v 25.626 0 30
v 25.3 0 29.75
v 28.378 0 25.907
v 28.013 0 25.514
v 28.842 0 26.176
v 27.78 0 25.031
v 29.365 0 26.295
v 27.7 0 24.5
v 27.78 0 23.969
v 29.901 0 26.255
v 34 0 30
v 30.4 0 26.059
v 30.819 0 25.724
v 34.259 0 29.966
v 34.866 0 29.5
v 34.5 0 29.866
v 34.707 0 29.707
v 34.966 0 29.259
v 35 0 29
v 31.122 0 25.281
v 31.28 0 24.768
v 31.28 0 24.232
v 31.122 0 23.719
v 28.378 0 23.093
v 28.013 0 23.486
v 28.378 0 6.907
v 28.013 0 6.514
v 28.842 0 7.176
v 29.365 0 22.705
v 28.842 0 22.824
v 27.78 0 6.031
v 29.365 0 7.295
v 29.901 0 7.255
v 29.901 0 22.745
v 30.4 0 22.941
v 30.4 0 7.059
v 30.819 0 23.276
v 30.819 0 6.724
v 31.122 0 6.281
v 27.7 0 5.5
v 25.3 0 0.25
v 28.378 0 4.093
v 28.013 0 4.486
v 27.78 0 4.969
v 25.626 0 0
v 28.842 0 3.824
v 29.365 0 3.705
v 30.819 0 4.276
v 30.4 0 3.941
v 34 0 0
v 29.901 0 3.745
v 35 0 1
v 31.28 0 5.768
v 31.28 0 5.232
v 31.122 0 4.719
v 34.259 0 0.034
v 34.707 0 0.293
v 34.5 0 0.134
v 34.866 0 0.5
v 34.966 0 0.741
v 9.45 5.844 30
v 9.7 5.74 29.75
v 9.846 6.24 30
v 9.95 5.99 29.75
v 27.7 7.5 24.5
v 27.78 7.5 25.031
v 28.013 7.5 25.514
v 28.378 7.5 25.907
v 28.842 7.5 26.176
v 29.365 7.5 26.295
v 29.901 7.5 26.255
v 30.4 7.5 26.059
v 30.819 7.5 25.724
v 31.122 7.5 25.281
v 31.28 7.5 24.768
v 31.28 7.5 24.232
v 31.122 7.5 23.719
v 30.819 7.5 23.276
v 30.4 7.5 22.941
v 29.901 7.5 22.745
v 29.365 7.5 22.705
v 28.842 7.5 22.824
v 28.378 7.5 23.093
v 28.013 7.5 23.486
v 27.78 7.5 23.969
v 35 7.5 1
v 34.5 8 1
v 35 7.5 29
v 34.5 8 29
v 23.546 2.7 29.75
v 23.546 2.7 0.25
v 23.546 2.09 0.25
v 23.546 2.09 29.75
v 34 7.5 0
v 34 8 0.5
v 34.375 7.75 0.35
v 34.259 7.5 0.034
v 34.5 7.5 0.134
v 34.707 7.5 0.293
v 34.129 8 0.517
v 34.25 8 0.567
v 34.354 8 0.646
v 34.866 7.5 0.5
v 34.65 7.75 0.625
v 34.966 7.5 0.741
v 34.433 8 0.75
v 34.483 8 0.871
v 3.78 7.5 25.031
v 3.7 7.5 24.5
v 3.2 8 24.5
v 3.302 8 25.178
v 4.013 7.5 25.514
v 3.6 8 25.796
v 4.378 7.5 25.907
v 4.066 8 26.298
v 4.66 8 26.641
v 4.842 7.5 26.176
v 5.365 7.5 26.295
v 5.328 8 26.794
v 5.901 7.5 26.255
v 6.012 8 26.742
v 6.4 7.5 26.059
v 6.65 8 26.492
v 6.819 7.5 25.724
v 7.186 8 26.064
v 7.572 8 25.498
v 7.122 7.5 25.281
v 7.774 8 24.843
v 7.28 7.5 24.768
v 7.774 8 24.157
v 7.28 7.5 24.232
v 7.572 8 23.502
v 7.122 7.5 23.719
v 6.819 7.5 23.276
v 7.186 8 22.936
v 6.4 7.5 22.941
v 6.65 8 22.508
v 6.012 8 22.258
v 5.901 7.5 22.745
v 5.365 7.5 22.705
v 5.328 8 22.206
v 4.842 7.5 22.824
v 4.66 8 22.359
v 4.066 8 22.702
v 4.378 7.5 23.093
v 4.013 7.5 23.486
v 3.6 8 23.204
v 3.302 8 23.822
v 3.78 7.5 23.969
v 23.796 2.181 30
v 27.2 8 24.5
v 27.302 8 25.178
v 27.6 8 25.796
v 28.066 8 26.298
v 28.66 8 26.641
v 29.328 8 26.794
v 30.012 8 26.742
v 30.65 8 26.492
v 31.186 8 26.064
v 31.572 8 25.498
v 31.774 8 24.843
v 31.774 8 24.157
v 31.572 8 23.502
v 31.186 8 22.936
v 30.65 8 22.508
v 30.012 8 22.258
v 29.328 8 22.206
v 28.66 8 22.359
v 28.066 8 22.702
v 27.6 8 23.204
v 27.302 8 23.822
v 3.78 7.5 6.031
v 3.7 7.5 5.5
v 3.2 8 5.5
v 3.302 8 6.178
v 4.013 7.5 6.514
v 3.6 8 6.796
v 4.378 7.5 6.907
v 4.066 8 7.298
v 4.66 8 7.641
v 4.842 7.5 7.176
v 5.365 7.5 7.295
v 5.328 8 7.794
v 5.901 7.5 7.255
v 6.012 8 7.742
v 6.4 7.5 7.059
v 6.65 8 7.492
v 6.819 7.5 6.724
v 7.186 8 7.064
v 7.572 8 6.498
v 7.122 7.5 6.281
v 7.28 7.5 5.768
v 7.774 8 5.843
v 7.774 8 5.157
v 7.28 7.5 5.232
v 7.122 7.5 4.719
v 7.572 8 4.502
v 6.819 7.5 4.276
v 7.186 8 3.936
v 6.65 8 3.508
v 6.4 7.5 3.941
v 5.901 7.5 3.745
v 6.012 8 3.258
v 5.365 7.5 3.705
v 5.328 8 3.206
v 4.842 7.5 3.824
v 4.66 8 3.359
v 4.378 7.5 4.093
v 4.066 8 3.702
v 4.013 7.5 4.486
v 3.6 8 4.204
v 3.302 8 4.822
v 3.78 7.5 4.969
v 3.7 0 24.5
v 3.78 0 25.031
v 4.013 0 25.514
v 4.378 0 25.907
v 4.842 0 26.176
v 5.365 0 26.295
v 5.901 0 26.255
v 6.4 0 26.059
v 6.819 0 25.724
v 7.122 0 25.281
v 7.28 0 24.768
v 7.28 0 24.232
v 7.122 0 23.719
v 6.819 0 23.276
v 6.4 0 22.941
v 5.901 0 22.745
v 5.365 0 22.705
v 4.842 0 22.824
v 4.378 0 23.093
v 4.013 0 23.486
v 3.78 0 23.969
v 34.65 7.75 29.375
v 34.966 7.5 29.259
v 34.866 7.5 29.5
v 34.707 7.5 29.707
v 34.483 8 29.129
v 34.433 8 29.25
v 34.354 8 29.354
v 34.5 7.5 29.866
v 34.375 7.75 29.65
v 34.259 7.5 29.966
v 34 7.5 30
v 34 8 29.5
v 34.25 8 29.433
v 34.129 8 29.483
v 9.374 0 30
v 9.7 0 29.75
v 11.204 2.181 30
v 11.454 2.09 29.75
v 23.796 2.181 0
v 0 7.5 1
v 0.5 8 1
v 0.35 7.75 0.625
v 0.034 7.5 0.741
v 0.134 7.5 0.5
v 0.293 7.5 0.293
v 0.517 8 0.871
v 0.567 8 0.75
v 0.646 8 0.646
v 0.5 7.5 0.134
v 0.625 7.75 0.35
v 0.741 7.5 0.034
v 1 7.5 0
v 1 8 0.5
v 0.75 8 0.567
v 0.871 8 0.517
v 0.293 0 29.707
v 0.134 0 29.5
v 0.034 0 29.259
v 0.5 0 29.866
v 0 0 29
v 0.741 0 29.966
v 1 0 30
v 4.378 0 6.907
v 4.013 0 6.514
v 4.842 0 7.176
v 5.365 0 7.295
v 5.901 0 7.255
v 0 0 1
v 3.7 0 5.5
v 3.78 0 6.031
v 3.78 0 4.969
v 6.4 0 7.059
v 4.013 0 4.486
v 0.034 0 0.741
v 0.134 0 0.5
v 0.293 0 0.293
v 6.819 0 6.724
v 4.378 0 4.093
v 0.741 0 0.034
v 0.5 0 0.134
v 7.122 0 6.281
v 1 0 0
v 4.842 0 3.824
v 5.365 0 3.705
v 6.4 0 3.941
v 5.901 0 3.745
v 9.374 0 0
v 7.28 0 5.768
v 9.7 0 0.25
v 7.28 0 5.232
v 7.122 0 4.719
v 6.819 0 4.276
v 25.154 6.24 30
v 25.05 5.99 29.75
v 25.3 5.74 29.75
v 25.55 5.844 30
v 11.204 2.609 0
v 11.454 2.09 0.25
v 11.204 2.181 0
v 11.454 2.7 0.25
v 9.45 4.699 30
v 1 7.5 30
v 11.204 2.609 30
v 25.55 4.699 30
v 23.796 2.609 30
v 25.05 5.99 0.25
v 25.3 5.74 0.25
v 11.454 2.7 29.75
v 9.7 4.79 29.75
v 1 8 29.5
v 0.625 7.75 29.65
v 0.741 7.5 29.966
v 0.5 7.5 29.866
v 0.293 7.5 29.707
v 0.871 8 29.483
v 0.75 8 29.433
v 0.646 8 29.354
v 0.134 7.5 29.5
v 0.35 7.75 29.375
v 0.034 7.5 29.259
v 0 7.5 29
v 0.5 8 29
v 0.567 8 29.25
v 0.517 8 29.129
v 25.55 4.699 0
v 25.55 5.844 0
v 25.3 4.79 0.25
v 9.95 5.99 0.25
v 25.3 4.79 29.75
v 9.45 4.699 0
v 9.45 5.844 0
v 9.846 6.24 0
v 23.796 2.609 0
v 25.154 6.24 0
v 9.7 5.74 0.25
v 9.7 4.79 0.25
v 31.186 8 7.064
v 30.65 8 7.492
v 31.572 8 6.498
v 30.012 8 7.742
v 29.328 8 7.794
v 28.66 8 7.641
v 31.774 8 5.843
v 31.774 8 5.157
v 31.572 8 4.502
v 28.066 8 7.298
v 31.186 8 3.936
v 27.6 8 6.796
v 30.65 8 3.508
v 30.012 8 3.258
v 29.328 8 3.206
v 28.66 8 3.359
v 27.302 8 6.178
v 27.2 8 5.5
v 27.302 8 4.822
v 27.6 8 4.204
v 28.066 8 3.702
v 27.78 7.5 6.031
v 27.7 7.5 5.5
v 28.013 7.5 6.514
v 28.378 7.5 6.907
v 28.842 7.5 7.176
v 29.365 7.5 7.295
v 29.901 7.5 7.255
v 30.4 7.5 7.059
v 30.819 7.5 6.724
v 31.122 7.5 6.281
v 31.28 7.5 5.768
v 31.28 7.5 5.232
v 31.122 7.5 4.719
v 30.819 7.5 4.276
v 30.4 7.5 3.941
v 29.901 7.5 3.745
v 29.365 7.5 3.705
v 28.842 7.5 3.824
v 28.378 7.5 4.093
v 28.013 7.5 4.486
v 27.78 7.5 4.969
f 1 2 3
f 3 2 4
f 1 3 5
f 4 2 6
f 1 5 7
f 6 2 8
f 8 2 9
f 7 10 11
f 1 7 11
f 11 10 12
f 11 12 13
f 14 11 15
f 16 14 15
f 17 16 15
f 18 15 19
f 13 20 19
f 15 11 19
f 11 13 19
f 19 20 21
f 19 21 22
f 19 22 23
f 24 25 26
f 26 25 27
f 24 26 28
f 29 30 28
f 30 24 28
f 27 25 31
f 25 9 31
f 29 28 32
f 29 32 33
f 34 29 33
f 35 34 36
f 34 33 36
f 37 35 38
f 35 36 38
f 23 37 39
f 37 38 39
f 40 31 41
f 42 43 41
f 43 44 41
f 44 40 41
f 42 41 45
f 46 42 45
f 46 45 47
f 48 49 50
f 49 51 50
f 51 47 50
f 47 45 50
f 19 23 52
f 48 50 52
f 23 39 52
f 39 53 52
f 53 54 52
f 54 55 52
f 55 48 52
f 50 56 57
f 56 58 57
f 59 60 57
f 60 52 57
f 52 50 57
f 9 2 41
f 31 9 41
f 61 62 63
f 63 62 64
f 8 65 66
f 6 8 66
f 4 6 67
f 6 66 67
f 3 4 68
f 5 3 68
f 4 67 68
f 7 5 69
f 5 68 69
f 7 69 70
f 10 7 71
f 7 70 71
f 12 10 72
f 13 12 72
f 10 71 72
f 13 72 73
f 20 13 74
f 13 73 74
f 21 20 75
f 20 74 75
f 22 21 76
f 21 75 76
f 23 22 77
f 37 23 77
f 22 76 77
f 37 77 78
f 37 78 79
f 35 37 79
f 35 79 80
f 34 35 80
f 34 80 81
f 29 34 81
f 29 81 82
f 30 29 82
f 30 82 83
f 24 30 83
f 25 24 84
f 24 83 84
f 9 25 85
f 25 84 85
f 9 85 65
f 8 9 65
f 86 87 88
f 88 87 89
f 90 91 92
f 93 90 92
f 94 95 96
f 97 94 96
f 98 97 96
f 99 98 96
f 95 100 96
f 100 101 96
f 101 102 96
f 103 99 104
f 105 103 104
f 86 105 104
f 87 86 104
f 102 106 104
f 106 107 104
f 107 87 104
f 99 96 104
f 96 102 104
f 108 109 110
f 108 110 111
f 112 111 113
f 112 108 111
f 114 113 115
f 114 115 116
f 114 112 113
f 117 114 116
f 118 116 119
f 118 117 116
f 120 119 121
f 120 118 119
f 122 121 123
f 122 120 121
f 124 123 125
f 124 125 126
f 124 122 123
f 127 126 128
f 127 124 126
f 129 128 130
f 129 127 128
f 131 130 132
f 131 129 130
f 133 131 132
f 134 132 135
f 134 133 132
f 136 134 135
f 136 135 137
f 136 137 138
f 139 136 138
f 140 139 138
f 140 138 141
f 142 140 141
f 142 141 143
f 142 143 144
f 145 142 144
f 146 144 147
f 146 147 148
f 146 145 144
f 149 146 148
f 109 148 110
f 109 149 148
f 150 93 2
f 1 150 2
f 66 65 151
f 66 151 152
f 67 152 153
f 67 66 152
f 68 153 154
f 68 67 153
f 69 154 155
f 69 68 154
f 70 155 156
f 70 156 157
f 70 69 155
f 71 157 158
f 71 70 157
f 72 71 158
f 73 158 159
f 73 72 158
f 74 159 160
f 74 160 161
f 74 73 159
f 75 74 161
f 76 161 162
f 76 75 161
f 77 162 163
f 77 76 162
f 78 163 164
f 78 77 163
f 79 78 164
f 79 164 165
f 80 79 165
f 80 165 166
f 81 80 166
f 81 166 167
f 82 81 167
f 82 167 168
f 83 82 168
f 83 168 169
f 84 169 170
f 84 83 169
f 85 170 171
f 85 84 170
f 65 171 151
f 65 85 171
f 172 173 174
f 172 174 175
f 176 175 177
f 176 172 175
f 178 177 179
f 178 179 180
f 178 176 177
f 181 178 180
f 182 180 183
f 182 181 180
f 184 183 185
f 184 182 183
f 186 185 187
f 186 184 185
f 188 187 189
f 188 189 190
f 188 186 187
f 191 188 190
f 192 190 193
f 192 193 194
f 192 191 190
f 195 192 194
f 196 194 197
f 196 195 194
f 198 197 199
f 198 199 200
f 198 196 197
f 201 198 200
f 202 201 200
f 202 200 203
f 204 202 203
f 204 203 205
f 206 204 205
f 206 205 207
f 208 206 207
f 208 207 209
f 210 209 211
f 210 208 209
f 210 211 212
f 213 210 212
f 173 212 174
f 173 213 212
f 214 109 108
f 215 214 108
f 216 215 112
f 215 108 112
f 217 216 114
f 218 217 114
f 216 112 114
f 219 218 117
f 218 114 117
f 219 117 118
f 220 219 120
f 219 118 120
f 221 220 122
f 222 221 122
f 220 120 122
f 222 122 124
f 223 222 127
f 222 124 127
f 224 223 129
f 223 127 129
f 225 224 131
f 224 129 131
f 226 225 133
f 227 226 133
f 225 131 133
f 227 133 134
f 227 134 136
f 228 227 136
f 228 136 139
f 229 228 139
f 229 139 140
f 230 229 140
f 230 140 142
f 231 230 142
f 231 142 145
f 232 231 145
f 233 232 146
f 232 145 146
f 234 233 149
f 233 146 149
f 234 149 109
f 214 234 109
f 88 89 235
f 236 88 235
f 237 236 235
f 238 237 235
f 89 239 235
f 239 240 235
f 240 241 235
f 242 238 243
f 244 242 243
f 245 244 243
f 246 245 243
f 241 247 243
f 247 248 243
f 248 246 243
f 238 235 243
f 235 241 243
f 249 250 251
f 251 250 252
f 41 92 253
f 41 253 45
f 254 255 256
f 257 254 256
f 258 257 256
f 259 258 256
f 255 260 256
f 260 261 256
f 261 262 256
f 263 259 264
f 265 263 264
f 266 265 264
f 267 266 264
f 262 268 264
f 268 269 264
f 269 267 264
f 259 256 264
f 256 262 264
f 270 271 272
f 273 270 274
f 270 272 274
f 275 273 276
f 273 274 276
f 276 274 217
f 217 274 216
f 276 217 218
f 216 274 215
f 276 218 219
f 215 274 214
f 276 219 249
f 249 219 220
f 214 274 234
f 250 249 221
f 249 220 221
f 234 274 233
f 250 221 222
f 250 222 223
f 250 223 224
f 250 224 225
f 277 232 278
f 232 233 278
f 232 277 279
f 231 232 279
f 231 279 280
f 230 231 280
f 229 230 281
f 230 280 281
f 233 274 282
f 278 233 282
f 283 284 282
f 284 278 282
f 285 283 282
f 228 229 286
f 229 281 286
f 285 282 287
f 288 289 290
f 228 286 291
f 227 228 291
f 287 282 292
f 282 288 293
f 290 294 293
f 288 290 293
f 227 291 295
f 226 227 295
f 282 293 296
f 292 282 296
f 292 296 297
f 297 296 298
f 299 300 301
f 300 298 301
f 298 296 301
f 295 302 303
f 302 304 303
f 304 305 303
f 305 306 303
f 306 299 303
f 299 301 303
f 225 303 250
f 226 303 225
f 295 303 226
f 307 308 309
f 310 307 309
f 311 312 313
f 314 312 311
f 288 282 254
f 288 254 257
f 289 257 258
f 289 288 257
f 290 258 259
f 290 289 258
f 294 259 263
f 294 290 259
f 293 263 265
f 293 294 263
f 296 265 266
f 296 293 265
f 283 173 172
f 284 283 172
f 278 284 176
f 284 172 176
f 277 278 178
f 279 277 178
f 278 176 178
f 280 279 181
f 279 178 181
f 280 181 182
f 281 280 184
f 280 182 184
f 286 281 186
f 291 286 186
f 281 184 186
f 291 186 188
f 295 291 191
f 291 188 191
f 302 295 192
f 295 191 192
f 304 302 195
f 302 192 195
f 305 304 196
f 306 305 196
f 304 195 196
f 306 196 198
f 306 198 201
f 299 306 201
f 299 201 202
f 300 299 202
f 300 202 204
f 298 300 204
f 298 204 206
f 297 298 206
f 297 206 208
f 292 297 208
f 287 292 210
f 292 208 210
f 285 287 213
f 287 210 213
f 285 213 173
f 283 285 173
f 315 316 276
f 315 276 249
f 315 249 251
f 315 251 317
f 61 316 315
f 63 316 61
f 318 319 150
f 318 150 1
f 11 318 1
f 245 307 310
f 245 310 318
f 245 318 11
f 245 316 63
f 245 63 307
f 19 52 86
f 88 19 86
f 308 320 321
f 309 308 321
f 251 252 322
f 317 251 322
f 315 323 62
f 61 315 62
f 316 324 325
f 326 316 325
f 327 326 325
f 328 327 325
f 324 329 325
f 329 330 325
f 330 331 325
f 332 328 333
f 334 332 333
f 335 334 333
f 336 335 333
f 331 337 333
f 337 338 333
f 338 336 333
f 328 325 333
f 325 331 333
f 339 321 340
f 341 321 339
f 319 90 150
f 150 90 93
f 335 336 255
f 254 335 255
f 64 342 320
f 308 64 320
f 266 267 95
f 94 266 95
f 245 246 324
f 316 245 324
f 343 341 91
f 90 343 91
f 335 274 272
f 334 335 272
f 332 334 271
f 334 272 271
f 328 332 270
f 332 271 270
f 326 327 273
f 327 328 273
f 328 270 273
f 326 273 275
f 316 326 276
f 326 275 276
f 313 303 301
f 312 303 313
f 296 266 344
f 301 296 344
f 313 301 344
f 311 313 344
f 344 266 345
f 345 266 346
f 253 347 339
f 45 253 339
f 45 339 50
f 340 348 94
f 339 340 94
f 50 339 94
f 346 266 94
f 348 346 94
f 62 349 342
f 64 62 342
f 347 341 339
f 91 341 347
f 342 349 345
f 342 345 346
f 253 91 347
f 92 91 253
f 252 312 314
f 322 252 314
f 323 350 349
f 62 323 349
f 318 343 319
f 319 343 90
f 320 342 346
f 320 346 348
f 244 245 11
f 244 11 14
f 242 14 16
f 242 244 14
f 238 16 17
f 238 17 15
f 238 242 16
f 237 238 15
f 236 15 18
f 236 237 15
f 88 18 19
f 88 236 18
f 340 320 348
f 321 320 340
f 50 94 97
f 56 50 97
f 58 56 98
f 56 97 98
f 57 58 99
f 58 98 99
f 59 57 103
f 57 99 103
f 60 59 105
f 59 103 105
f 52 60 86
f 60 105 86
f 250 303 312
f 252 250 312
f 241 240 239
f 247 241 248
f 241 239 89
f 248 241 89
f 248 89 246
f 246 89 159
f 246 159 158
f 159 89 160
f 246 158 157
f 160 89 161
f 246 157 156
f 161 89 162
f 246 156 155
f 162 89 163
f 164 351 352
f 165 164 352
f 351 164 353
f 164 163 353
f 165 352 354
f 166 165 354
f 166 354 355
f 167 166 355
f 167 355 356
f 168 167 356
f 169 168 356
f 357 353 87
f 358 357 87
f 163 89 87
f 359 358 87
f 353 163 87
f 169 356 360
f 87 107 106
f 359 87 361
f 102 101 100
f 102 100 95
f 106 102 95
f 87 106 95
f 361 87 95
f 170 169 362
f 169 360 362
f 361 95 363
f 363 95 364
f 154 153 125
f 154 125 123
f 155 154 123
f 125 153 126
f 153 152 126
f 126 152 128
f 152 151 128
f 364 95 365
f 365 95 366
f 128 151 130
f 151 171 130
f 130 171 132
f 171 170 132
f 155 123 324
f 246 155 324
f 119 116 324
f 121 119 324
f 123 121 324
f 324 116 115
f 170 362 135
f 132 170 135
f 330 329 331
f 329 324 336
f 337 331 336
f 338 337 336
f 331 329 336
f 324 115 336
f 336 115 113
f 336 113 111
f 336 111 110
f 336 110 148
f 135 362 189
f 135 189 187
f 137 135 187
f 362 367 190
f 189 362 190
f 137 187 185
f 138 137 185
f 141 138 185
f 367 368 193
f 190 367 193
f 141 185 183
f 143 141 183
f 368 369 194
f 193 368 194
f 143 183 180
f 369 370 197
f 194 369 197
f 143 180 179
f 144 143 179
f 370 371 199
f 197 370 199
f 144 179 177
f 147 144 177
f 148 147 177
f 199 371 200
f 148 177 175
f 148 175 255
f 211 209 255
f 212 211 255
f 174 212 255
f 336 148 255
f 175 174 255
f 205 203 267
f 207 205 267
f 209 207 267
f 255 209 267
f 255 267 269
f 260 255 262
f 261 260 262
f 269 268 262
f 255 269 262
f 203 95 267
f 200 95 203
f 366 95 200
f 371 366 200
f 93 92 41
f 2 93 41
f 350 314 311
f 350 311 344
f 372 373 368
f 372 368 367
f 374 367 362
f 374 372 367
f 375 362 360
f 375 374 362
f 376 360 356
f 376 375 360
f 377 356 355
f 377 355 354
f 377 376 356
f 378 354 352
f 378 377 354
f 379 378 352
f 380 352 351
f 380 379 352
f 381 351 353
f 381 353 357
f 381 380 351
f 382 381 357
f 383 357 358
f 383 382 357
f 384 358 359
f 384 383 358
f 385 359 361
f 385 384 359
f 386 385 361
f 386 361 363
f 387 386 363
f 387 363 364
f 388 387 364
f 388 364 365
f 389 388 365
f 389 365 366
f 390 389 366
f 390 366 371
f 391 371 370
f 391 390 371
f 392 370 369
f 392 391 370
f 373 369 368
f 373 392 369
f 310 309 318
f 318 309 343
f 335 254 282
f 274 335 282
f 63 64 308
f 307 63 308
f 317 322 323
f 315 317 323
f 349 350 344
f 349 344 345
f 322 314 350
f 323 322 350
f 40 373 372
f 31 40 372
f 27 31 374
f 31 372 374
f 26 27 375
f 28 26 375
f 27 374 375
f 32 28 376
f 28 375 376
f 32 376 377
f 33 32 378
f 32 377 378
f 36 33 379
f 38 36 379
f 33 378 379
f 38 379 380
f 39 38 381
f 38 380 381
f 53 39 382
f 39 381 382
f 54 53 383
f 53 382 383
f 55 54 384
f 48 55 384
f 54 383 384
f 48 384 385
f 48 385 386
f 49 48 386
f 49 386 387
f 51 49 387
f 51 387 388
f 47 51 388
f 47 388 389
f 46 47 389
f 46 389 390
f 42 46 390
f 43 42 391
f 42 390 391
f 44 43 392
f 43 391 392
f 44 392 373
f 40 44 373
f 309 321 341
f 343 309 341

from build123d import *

# Parameters (mm, degrees)
P_IDAT_VYSUNUT_M1_DEPTH  = 30
SKICA2_R                 = 1.8
ODEBRAT_VYSUNUT_M1_DEPTH = 8
ZAOBLIT1_R               = 1
ZKOSEN_2_SIZE            = 0.25
ZKOSEN_3_SIZE            = 0.5
ZKOSEN_4_SIZE            = 0.5


with BuildPart() as part:
    # Skica1 → Přidat vysunutím1 (new body)
    with BuildSketch(Plane.XY):
        Polygon((0, 0), (9.7, 0), (11.453718229, 2.09), (11.453718229, 2.7), (9.7, 4.79), (9.7, 5.74), (9.95, 5.99), (25.05, 5.99), (25.3, 5.74), (25.3, 4.79), (23.546281771, 2.7), (23.546281771, 2.09), (25.3, 0), (35, 0), (35, 8), (0, 8), align=None)
    extrude(amount=P_IDAT_VYSUNUT_M1_DEPTH)

    # Skica2 → Odebrat vysunutím1 (cut)
    with BuildSketch(Plane(origin=(0, 8, 0), x_dir=(1, 0, 0), z_dir=(0, 1, 0))):
        with Locations(Location((5.5, -5.5, 0), (0, 0, 180))):
            Circle(SKICA2_R)
        with Locations(Location((29.5, -5.5, 0), (0, 0, 180))):
            Circle(SKICA2_R)
        with Locations(Location((5.5, -24.5, 0), (0, 0, 180))):
            Circle(SKICA2_R)
        with Locations(Location((29.5, -24.5, 0), (0, 0, 180))):
            Circle(SKICA2_R)
    extrude(amount=-ODEBRAT_VYSUNUT_M1_DEPTH, mode=Mode.SUBTRACT)

    # Zaoblit1
    zaoblit1_edges = [part.edges().sort_by_distance(p)[0] for p in [
        (35, 4, 0),
        (0, 4, 0),
        (0, 4, 30),
        (35, 4, 30),
    ]]
    fillet(zaoblit1_edges, radius=ZAOBLIT1_R)

    # Zkosení2
    zkosen_2_edges = [part.edges().sort_by_distance(p)[0] for p in [
        (10.576859115, 1.045, 30),
        (11.453718229, 2.395, 30),
        (24.423140885, 1.045, 0),
        (23.546281771, 2.395, 0),
        (24.423140885, 3.745, 0),
        (25.3, 5.265, 0),
        (25.175, 5.865, 0),
        (17.5, 5.99, 0),
        (9.825, 5.865, 0),
        (9.7, 5.265, 0),
        (10.576859115, 3.745, 0),
        (11.453718229, 2.395, 0),
        (10.576859115, 3.745, 30),
        (10.576859115, 1.045, 0),
        (9.7, 5.265, 30),
        (9.825, 5.865, 30),
        (17.5, 5.99, 30),
        (25.175, 5.865, 30),
        (25.3, 5.265, 30),
        (24.423140885, 3.745, 30),
        (23.546281771, 2.395, 30),
        (24.423140885, 1.045, 30),
    ]]
    chamfer(zkosen_2_edges, length=ZKOSEN_2_SIZE)

    # Zkosení3
    zkosen_3_edges = [part.edges().sort_by_distance(p)[0] for p in [
        (17.5, 8, 30),
        (0, 8, 15),
        (17.5, 8, 0),
        (35, 8, 15),
        (34.707106781, 8, 0.292893219),
        (34.707106781, 8, 29.707106781),
        (0.292893219, 8, 0.292893219),
        (0.292893219, 8, 29.707106781),
    ]]
    chamfer(zkosen_3_edges, length=ZKOSEN_3_SIZE)

    # Zkosení4
    zkosen_4_edges = [part.edges().sort_by_distance(p)[0] for p in [
        (31.3, 8, 5.5),
        (7.3, 8, 24.5),
        (31.3, 8, 24.5),
        (7.3, 8, 5.5),
    ]]
    chamfer(zkosen_4_edges, length=ZKOSEN_4_SIZE)


solid = part.part
